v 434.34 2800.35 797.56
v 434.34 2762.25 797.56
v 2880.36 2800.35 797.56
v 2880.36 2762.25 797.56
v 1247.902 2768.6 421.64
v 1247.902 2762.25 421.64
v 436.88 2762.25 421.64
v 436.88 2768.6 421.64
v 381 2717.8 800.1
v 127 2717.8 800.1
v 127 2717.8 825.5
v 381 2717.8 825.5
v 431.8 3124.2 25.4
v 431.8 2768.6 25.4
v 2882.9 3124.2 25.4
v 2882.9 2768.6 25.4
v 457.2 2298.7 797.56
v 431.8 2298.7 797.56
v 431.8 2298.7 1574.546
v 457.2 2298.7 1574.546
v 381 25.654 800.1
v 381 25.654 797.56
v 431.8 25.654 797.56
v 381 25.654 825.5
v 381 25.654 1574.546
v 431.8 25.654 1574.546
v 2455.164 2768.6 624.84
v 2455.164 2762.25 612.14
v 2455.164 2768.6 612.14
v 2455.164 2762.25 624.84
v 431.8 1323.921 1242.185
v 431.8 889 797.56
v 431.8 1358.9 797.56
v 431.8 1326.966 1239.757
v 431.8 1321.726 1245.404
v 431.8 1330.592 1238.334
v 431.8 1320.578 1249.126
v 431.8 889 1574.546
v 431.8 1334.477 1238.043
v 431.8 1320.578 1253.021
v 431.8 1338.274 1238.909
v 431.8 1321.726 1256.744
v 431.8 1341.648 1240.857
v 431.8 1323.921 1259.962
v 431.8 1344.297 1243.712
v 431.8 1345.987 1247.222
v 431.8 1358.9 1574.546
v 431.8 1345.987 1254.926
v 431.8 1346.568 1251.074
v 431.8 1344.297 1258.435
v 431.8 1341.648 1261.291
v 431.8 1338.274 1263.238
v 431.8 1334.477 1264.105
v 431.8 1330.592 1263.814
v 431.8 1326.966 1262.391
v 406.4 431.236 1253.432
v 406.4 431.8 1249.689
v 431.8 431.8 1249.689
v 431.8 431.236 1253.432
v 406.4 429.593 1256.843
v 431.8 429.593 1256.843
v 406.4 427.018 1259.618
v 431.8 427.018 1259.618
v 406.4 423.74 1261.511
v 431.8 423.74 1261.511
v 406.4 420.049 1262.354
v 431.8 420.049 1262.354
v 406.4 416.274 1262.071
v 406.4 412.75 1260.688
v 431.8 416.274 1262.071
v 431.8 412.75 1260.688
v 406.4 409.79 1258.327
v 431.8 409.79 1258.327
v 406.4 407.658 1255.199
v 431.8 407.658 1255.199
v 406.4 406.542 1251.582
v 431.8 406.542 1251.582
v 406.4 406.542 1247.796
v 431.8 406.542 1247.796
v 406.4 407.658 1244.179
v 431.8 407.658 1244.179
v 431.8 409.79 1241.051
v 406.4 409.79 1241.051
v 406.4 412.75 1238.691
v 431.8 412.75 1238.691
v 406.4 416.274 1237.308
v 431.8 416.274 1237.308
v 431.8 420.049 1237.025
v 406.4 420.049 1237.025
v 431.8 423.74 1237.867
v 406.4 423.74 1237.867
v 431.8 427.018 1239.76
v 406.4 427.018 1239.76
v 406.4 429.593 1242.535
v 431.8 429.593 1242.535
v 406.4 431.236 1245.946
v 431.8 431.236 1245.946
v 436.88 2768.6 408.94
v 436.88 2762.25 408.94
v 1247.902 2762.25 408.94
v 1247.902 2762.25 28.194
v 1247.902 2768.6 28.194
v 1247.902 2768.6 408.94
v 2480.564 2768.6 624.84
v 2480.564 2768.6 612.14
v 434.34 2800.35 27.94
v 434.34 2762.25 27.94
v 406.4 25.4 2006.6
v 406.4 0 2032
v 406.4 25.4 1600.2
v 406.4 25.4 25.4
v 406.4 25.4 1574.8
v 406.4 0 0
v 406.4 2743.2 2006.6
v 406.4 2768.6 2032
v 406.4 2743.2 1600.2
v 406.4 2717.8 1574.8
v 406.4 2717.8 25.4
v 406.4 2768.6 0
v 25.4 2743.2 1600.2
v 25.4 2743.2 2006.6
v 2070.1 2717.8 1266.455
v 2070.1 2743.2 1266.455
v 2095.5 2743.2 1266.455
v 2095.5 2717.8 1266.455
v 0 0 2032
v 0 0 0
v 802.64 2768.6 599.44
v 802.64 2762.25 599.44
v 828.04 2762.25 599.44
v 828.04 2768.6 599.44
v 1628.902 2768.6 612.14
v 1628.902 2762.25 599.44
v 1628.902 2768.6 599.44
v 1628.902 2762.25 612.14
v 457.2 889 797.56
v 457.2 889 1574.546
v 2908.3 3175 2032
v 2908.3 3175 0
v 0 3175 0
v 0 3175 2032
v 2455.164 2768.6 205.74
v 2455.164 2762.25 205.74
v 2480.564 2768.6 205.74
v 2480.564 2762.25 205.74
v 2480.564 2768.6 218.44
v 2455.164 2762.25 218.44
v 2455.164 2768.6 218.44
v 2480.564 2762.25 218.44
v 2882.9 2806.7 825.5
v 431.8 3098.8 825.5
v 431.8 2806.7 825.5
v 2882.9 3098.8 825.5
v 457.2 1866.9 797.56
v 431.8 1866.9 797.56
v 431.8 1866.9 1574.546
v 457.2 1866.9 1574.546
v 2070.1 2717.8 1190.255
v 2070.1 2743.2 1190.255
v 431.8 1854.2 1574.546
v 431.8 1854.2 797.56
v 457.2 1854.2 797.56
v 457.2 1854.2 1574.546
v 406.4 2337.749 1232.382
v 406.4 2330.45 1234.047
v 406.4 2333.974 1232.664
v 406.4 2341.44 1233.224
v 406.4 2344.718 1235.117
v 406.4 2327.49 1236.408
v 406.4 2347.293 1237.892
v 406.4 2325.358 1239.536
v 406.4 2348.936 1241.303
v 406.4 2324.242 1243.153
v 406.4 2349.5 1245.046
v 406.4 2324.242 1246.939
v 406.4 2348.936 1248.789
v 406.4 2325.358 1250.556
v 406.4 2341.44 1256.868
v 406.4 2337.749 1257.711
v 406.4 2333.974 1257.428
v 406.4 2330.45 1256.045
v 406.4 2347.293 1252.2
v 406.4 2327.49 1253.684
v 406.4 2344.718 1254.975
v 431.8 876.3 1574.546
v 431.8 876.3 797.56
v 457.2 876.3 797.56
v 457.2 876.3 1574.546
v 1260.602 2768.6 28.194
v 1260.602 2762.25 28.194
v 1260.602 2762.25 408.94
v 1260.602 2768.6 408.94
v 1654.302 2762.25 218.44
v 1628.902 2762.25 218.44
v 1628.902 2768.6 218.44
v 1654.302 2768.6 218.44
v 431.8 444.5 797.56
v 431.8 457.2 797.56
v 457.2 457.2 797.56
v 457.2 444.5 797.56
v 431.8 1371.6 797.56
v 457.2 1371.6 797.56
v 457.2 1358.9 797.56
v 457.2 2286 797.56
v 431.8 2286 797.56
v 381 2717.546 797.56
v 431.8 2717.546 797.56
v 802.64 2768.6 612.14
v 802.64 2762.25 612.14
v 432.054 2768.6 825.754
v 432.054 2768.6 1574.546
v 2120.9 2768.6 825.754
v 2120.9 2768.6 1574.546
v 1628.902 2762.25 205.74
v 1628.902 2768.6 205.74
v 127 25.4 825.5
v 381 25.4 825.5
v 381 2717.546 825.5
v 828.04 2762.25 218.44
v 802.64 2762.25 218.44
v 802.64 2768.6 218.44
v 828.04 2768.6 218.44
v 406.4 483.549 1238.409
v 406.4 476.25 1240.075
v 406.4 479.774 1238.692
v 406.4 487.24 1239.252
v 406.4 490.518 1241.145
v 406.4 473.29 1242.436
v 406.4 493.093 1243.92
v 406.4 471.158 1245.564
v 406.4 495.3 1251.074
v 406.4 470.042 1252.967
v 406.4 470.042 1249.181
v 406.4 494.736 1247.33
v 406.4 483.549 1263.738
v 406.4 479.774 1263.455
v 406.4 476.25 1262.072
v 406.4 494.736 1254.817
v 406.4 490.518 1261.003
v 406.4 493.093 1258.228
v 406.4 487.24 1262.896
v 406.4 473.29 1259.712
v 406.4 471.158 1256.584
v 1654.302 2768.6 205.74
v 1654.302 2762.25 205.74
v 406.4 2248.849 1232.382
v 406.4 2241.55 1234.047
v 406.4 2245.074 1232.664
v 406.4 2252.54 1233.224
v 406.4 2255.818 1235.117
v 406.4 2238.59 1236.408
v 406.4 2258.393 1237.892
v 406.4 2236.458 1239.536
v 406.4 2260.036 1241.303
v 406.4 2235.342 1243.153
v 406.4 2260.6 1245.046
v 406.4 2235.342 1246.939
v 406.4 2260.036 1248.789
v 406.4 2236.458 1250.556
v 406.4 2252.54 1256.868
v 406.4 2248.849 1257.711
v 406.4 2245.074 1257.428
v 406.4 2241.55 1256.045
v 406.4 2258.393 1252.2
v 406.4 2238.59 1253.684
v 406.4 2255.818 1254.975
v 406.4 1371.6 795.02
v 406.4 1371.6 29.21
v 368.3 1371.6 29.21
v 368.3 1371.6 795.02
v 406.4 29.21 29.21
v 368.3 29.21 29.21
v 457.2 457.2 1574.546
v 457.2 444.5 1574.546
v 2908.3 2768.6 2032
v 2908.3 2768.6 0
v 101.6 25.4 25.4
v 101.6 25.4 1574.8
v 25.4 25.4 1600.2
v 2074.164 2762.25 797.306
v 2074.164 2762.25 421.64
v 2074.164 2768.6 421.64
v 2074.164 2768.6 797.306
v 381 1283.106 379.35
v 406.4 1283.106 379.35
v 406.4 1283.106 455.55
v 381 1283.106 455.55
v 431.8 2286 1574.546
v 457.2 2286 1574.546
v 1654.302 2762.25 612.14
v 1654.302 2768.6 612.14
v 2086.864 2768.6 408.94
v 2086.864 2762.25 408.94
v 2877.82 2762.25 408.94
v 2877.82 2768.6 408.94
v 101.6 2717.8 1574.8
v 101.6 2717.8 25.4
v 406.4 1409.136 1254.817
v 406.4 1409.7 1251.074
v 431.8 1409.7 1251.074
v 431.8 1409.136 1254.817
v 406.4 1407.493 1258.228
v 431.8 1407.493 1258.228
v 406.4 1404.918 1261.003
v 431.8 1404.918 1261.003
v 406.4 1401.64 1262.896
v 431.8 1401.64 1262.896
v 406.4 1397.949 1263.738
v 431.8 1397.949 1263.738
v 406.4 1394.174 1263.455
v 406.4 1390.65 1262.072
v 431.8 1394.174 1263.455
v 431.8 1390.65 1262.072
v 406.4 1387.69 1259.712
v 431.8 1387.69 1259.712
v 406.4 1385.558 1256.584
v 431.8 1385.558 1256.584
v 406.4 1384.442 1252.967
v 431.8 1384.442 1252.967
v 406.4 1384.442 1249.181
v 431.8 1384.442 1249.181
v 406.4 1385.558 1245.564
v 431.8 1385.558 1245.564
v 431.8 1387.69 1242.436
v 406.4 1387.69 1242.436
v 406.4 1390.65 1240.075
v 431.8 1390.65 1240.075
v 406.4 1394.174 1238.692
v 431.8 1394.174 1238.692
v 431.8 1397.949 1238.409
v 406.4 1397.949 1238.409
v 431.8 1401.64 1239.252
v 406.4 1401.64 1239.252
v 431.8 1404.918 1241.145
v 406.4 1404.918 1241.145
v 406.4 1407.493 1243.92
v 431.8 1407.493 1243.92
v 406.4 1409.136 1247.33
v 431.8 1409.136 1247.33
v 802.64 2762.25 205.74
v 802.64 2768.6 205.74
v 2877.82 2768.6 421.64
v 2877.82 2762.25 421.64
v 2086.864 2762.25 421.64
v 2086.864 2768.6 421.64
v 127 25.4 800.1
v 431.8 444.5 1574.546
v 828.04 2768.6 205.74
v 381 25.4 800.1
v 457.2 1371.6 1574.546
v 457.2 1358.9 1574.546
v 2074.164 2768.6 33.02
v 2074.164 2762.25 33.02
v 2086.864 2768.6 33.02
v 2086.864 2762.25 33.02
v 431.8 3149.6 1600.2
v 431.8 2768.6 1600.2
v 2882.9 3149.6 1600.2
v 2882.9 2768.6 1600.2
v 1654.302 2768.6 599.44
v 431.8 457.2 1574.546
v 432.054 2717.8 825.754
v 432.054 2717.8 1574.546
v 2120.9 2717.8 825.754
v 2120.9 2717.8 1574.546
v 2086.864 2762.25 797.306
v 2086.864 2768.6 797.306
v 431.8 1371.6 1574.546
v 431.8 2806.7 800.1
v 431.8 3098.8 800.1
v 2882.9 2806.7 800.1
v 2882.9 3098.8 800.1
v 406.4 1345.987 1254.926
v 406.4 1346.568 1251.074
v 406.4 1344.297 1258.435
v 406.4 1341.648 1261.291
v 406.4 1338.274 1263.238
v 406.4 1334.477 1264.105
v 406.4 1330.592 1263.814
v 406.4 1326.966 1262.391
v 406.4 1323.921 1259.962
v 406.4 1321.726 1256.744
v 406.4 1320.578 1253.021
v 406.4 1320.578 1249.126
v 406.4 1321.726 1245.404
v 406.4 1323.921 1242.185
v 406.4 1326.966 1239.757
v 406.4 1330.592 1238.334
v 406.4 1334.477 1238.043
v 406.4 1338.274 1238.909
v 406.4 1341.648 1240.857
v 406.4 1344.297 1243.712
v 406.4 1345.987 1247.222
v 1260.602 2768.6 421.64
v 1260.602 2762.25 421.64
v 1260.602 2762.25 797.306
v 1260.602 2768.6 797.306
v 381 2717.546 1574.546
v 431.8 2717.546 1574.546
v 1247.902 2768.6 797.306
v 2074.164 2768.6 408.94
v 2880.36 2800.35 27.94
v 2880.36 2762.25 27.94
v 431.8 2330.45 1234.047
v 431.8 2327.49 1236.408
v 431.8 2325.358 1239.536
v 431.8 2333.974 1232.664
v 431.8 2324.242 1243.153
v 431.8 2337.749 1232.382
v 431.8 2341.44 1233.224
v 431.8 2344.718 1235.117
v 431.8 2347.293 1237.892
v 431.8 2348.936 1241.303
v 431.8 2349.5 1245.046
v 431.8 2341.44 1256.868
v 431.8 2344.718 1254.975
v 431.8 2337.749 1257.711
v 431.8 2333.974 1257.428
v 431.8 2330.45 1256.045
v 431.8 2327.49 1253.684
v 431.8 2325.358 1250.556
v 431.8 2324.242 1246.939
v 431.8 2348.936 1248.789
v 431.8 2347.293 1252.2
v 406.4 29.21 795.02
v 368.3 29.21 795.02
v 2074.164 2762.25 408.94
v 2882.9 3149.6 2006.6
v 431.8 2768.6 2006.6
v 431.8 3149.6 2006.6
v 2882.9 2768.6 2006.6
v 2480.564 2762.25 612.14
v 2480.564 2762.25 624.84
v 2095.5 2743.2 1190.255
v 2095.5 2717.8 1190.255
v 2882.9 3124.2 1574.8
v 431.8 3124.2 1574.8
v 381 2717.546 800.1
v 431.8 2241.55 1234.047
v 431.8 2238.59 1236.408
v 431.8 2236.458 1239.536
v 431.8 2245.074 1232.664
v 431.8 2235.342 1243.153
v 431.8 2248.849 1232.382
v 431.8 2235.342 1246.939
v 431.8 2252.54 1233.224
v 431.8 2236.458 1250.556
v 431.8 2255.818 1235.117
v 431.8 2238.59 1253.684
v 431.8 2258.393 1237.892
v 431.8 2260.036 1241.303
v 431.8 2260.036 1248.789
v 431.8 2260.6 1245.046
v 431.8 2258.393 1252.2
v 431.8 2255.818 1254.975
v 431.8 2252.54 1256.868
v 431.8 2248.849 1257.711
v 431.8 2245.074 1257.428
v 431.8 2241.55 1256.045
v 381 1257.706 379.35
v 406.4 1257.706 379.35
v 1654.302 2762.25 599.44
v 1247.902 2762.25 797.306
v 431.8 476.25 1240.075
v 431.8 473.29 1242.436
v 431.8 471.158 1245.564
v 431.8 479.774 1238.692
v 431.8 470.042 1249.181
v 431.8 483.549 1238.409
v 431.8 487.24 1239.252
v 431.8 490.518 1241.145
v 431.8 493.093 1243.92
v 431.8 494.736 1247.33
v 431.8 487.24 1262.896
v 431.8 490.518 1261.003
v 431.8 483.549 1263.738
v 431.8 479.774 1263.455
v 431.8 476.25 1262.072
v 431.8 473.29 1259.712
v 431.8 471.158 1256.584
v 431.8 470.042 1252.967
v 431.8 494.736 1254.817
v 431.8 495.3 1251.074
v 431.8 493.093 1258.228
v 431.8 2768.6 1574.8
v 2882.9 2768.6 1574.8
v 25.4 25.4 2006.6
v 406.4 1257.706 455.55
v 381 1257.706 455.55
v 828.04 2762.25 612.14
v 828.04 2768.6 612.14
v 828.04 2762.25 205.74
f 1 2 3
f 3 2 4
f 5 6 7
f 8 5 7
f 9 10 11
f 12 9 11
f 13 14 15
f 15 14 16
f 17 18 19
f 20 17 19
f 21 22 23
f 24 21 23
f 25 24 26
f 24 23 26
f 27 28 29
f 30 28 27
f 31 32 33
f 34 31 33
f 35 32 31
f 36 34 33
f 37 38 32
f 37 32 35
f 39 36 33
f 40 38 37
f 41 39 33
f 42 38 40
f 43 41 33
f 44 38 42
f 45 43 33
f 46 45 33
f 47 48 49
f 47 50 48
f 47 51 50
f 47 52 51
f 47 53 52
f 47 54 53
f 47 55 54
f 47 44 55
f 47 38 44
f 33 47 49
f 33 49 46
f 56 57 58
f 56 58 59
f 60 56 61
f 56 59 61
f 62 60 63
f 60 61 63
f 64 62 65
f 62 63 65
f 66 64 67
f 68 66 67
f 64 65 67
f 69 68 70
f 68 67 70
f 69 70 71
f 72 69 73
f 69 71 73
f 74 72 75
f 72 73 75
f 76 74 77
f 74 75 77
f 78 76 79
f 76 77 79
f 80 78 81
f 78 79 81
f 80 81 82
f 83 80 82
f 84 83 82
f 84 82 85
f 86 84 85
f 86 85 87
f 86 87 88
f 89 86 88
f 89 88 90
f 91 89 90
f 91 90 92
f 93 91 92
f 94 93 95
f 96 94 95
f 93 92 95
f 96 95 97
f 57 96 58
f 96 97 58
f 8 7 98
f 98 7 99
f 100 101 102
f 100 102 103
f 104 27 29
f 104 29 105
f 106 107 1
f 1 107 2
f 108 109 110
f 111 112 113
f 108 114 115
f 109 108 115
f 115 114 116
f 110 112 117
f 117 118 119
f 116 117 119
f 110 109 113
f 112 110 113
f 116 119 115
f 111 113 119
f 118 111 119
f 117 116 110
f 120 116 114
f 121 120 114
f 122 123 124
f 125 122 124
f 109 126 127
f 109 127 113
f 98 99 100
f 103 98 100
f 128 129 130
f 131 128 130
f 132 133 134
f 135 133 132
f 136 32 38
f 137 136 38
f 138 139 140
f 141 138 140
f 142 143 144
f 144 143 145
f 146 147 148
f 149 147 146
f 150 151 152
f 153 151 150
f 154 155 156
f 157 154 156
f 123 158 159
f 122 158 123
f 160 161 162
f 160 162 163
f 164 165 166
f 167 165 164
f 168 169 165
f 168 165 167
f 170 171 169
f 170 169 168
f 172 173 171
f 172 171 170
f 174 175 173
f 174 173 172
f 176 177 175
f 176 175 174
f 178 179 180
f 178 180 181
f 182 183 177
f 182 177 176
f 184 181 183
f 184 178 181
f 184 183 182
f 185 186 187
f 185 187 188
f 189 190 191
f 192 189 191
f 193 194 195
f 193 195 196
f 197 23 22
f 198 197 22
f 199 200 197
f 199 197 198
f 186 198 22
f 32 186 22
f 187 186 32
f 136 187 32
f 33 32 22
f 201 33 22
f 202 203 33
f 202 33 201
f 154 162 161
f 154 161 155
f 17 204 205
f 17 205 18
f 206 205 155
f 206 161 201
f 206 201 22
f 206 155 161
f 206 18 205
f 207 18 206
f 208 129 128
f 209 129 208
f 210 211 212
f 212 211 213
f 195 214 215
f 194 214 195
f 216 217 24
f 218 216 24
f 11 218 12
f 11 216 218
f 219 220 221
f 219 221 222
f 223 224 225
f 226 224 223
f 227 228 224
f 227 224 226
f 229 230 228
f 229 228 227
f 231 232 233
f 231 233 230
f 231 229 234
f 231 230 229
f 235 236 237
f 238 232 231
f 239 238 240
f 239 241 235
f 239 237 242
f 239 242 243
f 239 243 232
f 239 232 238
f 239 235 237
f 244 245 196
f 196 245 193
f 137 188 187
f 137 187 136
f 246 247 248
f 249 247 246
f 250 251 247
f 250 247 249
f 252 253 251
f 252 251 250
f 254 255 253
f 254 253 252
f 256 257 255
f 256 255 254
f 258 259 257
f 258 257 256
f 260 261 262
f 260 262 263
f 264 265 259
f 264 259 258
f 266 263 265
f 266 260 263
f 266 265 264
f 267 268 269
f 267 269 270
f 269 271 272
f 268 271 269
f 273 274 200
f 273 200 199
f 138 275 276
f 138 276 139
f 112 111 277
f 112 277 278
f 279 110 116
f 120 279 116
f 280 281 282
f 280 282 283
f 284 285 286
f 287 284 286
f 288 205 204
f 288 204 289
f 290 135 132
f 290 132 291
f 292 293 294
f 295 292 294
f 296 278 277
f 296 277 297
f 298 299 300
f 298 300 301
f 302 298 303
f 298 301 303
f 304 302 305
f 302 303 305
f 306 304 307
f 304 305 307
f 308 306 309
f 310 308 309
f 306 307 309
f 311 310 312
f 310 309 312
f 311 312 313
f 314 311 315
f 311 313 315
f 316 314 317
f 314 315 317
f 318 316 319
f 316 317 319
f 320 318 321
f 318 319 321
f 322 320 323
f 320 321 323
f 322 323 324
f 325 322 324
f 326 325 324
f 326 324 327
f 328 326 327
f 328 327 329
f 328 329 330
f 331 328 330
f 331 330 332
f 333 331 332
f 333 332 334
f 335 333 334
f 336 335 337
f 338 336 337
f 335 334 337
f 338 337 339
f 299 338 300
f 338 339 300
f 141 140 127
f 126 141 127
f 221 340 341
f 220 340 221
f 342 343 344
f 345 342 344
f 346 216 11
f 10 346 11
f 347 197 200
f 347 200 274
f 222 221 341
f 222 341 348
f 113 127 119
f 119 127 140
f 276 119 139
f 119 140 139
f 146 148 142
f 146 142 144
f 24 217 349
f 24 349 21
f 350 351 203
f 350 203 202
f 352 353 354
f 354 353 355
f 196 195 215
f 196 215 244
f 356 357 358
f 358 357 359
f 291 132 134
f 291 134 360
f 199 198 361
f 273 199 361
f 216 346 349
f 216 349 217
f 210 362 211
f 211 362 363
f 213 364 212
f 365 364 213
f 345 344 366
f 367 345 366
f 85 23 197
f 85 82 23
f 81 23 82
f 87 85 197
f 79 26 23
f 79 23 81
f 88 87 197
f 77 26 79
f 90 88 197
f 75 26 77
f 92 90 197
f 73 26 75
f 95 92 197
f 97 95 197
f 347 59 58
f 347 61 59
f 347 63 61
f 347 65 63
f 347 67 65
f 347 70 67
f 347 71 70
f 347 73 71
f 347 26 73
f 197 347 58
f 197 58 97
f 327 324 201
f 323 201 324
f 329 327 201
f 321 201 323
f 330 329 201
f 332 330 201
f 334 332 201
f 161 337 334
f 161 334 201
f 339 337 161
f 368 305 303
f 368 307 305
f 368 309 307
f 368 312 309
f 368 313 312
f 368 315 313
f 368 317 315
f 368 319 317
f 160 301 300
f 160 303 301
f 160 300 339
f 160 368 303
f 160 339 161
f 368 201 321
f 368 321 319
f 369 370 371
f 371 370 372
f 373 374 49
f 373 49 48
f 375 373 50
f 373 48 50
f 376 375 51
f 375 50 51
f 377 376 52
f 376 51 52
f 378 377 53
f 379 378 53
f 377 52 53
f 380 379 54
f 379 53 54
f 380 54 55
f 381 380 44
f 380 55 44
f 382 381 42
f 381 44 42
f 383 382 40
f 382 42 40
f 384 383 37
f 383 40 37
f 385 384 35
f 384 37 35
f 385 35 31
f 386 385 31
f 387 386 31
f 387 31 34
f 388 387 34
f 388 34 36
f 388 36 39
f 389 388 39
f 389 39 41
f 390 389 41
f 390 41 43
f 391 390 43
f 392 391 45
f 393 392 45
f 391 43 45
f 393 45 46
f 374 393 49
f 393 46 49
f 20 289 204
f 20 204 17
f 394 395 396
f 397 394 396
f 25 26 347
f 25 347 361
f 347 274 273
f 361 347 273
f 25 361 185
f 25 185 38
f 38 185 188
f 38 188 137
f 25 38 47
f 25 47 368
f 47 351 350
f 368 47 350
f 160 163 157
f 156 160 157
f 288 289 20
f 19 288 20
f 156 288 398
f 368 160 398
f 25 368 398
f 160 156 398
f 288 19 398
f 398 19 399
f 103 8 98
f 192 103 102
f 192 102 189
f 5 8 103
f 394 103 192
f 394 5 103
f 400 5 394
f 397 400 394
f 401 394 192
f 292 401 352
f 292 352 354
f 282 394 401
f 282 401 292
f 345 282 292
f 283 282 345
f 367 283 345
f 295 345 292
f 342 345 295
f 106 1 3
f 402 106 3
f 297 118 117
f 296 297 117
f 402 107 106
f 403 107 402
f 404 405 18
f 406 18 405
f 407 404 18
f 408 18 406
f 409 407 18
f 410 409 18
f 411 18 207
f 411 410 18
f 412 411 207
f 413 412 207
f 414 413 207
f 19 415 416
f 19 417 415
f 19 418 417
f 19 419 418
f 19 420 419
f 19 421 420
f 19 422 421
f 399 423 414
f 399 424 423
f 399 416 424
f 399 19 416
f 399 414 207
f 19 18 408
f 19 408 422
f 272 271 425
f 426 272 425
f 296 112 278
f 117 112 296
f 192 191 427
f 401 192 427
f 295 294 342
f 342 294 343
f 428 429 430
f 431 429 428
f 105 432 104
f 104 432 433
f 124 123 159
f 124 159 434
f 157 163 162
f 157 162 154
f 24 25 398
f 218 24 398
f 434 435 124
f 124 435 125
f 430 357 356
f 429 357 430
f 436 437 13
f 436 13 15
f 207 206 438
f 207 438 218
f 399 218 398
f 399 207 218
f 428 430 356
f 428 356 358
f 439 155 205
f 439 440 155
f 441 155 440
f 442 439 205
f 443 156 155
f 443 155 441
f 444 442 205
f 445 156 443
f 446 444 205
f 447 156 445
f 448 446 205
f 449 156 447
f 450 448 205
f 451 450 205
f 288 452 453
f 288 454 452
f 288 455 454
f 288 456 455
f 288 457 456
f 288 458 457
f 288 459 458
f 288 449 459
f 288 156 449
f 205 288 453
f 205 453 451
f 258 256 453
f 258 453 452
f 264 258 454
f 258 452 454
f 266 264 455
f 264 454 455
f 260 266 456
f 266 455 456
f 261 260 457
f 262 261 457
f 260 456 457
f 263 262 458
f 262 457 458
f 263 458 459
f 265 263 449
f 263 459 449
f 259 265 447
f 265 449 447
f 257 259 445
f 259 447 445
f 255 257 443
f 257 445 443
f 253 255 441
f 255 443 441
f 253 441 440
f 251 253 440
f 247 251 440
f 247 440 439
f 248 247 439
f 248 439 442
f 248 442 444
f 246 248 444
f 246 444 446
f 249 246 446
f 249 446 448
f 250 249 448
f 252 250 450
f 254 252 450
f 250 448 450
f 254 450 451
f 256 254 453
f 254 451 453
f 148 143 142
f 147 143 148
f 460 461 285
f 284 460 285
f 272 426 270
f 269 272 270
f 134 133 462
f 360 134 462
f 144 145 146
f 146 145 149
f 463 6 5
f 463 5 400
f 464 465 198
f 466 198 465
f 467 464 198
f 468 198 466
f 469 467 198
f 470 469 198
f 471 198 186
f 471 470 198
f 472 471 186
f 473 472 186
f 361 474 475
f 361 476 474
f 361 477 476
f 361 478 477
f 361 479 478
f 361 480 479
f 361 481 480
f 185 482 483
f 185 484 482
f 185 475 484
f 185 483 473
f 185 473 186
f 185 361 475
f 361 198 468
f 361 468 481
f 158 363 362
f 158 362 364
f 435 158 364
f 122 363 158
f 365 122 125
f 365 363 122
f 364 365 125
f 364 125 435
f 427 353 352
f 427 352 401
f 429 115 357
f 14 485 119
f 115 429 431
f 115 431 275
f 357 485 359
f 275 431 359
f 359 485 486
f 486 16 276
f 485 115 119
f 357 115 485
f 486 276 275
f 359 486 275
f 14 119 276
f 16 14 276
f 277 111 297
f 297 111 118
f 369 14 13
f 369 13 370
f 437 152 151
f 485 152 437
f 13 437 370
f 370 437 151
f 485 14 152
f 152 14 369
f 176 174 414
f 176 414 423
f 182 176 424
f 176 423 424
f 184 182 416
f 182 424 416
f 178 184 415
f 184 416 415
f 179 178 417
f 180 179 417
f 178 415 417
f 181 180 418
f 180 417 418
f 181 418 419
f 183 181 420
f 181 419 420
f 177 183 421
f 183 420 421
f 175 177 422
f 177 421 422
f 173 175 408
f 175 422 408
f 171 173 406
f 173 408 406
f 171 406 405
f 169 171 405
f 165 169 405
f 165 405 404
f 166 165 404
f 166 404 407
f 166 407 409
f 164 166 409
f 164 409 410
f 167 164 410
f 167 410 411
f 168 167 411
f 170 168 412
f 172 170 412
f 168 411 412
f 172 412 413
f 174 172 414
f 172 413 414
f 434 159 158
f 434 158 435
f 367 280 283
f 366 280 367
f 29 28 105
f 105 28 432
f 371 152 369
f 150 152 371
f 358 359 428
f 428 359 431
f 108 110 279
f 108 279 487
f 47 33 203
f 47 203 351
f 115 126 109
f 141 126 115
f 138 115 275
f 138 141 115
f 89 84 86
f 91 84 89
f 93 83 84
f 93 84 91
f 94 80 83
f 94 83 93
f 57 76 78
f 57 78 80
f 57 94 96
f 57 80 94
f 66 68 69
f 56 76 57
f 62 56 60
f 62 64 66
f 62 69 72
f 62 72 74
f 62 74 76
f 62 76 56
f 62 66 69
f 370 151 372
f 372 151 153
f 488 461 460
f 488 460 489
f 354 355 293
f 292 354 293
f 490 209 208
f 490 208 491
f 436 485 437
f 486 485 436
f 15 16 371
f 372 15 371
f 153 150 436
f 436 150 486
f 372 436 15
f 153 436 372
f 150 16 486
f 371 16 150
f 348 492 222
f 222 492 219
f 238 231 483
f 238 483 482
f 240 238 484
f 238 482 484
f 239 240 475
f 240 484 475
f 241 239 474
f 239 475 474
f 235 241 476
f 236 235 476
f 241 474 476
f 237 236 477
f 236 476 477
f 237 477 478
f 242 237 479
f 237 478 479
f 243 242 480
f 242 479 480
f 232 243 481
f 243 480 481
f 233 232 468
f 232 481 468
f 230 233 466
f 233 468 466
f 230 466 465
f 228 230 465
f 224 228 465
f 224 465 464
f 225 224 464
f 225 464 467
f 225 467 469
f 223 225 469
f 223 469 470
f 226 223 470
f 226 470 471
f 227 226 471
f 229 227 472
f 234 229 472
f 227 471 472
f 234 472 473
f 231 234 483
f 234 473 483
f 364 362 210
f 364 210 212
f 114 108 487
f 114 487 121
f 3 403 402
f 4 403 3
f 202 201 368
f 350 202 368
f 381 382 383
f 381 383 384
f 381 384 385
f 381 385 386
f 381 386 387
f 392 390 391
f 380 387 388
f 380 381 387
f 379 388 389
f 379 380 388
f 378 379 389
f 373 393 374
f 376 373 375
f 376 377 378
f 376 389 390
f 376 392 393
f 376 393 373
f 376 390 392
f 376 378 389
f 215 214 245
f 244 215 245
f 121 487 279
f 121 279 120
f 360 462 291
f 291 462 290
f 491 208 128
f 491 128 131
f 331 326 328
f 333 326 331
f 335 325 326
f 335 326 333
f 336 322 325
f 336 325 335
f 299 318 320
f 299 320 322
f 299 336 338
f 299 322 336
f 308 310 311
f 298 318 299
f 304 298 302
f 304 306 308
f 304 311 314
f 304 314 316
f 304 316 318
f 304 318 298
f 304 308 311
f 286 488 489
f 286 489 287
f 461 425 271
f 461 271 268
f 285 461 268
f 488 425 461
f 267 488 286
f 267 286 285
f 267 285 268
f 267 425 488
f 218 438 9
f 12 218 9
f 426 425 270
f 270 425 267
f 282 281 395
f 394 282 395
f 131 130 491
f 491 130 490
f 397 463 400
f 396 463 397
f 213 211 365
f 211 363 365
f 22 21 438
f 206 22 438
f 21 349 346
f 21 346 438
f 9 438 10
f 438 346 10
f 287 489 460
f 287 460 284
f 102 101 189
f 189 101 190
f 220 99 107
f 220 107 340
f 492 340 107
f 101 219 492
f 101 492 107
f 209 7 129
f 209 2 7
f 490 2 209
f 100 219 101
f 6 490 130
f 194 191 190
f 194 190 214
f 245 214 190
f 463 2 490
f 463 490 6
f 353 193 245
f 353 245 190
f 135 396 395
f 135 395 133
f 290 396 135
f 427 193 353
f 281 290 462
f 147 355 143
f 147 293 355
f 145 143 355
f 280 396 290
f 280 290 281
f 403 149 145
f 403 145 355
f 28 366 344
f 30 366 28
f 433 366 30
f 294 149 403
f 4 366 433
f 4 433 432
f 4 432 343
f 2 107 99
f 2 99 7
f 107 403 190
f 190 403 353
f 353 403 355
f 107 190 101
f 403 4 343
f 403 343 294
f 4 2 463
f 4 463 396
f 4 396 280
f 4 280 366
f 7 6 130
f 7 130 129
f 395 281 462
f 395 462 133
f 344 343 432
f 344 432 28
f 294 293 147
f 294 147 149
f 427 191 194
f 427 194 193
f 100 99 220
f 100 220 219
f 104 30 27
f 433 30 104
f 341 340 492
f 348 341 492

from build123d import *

# Parameters (mm, degrees)
F1_DEPTH       = 2032
F3_W           = 2717.8
F3_H           = 406.4
F4_DEPTH       = 381
F5_W           = 2692.4
F5_H           = 1549.4
F6_DEPTH       = 330.2
F8_W           = 2451.1
F8_H           = 406.4
F9_DEPTH       = 406.4
F11_W          = 2692.4
F11_H          = 25.4
F12_DEPTH      = 254
F14_W          = 1342.39
F14_H          = 765.81
F15_DEPTH      = 38.1
F17_W          = 2451.1
F17_H          = 1549.4
F18_DEPTH      = 355.6
F20_W          = 2451.1
F20_H          = 25.4
F21_DEPTH      = 292.1
F23_W          = 2446.02
F23_H          = 769.62
F24_DEPTH      = 19.05
F24_DEPTH_BACK = 19.05
F25_W          = 12.7
F25_H          = 380.746
F25_H_2        = 375.666
F25_H_3        = 375.92
F26_DEPTH      = 25.4
F27_W          = 25.4
F27_H          = 12.7
F28_DEPTH      = 25.4
F29_W          = 1688.846
F29_H          = 748.792
F30_DEPTH      = 25.4
F30_DEPTH_BACK = 25.4
F31_W          = 25.4
F31_H          = 76.2
F32_DEPTH      = 25.4
F33_W          = 25.4
F33_H          = 76.2
F34_DEPTH      = 25.4
F35_W          = 2691.892
F35_H          = 776.986
F36_DEPTH      = 25.4
F36_DEPTH_BACK = 25.4
F37_W          = 12.7
F37_H          = 776.986
F38_DEPTH      = 25.4
F39_R          = 12.7
F39_R_2        = 13.0678155546
F40_DEPTH      = 25.4


with BuildPart() as f1:
    # F0 (on Top) → F1 (new body)
    with BuildSketch(Plane.XY):
        Polygon((0, 3175), (0, 0), (406.4, 0), (406.4, 2768.6), (2908.3, 2768.6), (2908.3, 3175), align=None)
    extrude(amount=F1_DEPTH)

    # F3 (on face) → F4 (cut)
    with BuildSketch(Plane.YZ.offset(406.4)):
        with Locations((1384.3, 1803.4)):
            Rectangle(F3_W, F3_H)
    extrude(amount=-F4_DEPTH, mode=Mode.SUBTRACT)

    # F5 (on offset) → F6 (cut)
    with BuildSketch(Plane.YZ.offset(431.8)):
        with Locations((1371.6, 800.1)):
            Rectangle(F5_W, F5_H)
    extrude(amount=-F6_DEPTH, mode=Mode.SUBTRACT)

    # F8 (on offset) → F9 (cut)
    with BuildSketch(Plane.XZ.offset(-2743.2)):
        with Locations((1657.35, 1803.4)):
            Rectangle(F8_W, F8_H)
    extrude(amount=-F9_DEPTH, mode=Mode.SUBTRACT)

    # F17 (on face) → F18 (cut)
    with BuildSketch(Plane.XZ.offset(-2768.6)):
        with Locations((1657.35, 800.1)):
            Rectangle(F17_W, F17_H)
    extrude(amount=-F18_DEPTH, mode=Mode.SUBTRACT)

    # F20 (on offset) → F21 (join)
    with BuildSketch(Plane.XZ.offset(-3098.8)):
        with Locations((1657.35, 812.8)):
            Rectangle(F20_W, F20_H)
    extrude(amount=F21_DEPTH)


with BuildPart() as f12:
    # F11 (on offset) → F12 (new body)
    with BuildSketch(Plane.YZ.offset(127)):
        with Locations((1371.6, 812.8)):
            Rectangle(F11_W, F11_H)
    extrude(amount=F12_DEPTH)

    # F35 (on offset) → F36 (join, two sides)
    with BuildSketch(Plane.YZ.offset(406.4)) as f36_sk:
        with Locations((1371.6, 1186.053)):
            Rectangle(F35_W, F35_H)
    extrude(amount=F36_DEPTH)
    extrude(f36_sk.sketch, amount=-F36_DEPTH_BACK)

    # F37 (on face) → F38 (join)
    with BuildSketch(Plane.YZ.offset(431.8)):
        with Locations((450.85, 1186.053)):
            Rectangle(F37_W, F37_H)
        with Locations((882.65, 1186.053)):
            Rectangle(F37_W, F37_H)
        with Locations((2292.35, 1186.053)):
            Rectangle(F37_W, F37_H)
        with Locations((1860.55, 1186.053)):
            Rectangle(F37_W, F37_H)
        with Locations((1365.25, 1186.053)):
            Rectangle(F37_W, F37_H)
    extrude(amount=F38_DEPTH)

    # F39 (on face) → F40 (cut)
    with BuildSketch(Plane.YZ.offset(431.8)):
        with Locations((419.1, 1249.6890985292)):
            Circle(F39_R)
        with Locations((482.6, 1251.0738372803)):
            Circle(F39_R)
        with Locations((1333.5, 1251.0738372803)):
            Circle(F39_R_2)
        with Locations((1397, 1251.0738372803)):
            Circle(F39_R)
        with Locations((2247.9, 1245.0460195541)):
            Circle(F39_R)
        with Locations((2336.8, 1245.0460195541)):
            Circle(F39_R)
    extrude(amount=-F40_DEPTH, mode=Mode.SUBTRACT)


with BuildPart() as f15:
    # F14 (on offset) → F15 (new body)
    with BuildSketch(Plane.YZ.offset(406.4)):
        with Locations((700.405, 412.115)):
            Rectangle(F14_W, F14_H)
    extrude(amount=-F15_DEPTH)

    # F33 (on face) → F34 (cut)
    with BuildSketch(Plane.YZ.offset(406.4)):
        with Locations((1270.4063653946, 417.4502300538)):
            Rectangle(F33_W, F33_H)
    extrude(amount=-F34_DEPTH, mode=Mode.SUBTRACT)


with BuildPart() as f24:
    # F23 (on offset) → F24 (new body, two sides)
    with BuildSketch(Plane.XZ.offset(-2781.3)) as f24_sk:
        with Locations((1657.35, 412.75)):
            Rectangle(F23_W, F23_H)
    extrude(amount=F24_DEPTH)
    extrude(f24_sk.sketch, amount=-F24_DEPTH_BACK)

    # F25 (on offset) → F26 (cut)
    with BuildSketch(Plane.XZ.offset(-2743.2)):
        Polygon((436.88, 421.64), (436.88, 408.94), (1247.902, 408.94), (1260.602, 408.94), (2074.164, 408.94), (2086.864, 408.94), (2877.82, 408.94), (2877.82, 421.64), (2086.864, 421.64), (2074.164, 421.64), (1260.602, 421.64), (1247.902, 421.64), align=None)
        with Locations((1254.252, 218.567)):
            Rectangle(F25_W, F25_H)
        with Locations((1254.252, 609.473)):
            Rectangle(F25_W, F25_H_2)
        with Locations((2080.514, 220.98)):
            Rectangle(F25_W, F25_H_3)
        with Locations((2080.514, 609.473)):
            Rectangle(F25_W, F25_H_2)
    extrude(amount=-F26_DEPTH, mode=Mode.SUBTRACT)

    # F27 (on offset) → F28 (cut)
    with BuildSketch(Plane.XZ.offset(-2743.2)):
        with Locations((815.34, 605.79)):
            Rectangle(F27_W, F27_H)
        with Locations((815.34, 212.09)):
            Rectangle(F27_W, F27_H)
        with Locations((1641.602, 605.79)):
            Rectangle(F27_W, F27_H)
        with Locations((1641.602, 212.09)):
            Rectangle(F27_W, F27_H)
        with Locations((2467.864, 618.49)):
            Rectangle(F27_W, F27_H)
        with Locations((2467.864, 212.09)):
            Rectangle(F27_W, F27_H)
    extrude(amount=-F28_DEPTH, mode=Mode.SUBTRACT)


with BuildPart() as f30:
    # F29 (on offset) → F30 (new body, two sides)
    with BuildSketch(Plane.XZ.offset(-2743.2)) as f30_sk:
        with Locations((1276.477, 1200.15)):
            Rectangle(F29_W, F29_H)
    extrude(amount=F30_DEPTH)
    extrude(f30_sk.sketch, amount=-F30_DEPTH_BACK)

    # F31 (on face) → F32 (cut)
    with BuildSketch(Plane.XZ.offset(-2717.8)):
        with Locations((2082.8, 1228.3547520638)):
            Rectangle(F31_W, F31_H)
    extrude(amount=-F32_DEPTH, mode=Mode.SUBTRACT)


solid = Compound([f1.part, f12.part, f15.part, f24.part, f30.part])
